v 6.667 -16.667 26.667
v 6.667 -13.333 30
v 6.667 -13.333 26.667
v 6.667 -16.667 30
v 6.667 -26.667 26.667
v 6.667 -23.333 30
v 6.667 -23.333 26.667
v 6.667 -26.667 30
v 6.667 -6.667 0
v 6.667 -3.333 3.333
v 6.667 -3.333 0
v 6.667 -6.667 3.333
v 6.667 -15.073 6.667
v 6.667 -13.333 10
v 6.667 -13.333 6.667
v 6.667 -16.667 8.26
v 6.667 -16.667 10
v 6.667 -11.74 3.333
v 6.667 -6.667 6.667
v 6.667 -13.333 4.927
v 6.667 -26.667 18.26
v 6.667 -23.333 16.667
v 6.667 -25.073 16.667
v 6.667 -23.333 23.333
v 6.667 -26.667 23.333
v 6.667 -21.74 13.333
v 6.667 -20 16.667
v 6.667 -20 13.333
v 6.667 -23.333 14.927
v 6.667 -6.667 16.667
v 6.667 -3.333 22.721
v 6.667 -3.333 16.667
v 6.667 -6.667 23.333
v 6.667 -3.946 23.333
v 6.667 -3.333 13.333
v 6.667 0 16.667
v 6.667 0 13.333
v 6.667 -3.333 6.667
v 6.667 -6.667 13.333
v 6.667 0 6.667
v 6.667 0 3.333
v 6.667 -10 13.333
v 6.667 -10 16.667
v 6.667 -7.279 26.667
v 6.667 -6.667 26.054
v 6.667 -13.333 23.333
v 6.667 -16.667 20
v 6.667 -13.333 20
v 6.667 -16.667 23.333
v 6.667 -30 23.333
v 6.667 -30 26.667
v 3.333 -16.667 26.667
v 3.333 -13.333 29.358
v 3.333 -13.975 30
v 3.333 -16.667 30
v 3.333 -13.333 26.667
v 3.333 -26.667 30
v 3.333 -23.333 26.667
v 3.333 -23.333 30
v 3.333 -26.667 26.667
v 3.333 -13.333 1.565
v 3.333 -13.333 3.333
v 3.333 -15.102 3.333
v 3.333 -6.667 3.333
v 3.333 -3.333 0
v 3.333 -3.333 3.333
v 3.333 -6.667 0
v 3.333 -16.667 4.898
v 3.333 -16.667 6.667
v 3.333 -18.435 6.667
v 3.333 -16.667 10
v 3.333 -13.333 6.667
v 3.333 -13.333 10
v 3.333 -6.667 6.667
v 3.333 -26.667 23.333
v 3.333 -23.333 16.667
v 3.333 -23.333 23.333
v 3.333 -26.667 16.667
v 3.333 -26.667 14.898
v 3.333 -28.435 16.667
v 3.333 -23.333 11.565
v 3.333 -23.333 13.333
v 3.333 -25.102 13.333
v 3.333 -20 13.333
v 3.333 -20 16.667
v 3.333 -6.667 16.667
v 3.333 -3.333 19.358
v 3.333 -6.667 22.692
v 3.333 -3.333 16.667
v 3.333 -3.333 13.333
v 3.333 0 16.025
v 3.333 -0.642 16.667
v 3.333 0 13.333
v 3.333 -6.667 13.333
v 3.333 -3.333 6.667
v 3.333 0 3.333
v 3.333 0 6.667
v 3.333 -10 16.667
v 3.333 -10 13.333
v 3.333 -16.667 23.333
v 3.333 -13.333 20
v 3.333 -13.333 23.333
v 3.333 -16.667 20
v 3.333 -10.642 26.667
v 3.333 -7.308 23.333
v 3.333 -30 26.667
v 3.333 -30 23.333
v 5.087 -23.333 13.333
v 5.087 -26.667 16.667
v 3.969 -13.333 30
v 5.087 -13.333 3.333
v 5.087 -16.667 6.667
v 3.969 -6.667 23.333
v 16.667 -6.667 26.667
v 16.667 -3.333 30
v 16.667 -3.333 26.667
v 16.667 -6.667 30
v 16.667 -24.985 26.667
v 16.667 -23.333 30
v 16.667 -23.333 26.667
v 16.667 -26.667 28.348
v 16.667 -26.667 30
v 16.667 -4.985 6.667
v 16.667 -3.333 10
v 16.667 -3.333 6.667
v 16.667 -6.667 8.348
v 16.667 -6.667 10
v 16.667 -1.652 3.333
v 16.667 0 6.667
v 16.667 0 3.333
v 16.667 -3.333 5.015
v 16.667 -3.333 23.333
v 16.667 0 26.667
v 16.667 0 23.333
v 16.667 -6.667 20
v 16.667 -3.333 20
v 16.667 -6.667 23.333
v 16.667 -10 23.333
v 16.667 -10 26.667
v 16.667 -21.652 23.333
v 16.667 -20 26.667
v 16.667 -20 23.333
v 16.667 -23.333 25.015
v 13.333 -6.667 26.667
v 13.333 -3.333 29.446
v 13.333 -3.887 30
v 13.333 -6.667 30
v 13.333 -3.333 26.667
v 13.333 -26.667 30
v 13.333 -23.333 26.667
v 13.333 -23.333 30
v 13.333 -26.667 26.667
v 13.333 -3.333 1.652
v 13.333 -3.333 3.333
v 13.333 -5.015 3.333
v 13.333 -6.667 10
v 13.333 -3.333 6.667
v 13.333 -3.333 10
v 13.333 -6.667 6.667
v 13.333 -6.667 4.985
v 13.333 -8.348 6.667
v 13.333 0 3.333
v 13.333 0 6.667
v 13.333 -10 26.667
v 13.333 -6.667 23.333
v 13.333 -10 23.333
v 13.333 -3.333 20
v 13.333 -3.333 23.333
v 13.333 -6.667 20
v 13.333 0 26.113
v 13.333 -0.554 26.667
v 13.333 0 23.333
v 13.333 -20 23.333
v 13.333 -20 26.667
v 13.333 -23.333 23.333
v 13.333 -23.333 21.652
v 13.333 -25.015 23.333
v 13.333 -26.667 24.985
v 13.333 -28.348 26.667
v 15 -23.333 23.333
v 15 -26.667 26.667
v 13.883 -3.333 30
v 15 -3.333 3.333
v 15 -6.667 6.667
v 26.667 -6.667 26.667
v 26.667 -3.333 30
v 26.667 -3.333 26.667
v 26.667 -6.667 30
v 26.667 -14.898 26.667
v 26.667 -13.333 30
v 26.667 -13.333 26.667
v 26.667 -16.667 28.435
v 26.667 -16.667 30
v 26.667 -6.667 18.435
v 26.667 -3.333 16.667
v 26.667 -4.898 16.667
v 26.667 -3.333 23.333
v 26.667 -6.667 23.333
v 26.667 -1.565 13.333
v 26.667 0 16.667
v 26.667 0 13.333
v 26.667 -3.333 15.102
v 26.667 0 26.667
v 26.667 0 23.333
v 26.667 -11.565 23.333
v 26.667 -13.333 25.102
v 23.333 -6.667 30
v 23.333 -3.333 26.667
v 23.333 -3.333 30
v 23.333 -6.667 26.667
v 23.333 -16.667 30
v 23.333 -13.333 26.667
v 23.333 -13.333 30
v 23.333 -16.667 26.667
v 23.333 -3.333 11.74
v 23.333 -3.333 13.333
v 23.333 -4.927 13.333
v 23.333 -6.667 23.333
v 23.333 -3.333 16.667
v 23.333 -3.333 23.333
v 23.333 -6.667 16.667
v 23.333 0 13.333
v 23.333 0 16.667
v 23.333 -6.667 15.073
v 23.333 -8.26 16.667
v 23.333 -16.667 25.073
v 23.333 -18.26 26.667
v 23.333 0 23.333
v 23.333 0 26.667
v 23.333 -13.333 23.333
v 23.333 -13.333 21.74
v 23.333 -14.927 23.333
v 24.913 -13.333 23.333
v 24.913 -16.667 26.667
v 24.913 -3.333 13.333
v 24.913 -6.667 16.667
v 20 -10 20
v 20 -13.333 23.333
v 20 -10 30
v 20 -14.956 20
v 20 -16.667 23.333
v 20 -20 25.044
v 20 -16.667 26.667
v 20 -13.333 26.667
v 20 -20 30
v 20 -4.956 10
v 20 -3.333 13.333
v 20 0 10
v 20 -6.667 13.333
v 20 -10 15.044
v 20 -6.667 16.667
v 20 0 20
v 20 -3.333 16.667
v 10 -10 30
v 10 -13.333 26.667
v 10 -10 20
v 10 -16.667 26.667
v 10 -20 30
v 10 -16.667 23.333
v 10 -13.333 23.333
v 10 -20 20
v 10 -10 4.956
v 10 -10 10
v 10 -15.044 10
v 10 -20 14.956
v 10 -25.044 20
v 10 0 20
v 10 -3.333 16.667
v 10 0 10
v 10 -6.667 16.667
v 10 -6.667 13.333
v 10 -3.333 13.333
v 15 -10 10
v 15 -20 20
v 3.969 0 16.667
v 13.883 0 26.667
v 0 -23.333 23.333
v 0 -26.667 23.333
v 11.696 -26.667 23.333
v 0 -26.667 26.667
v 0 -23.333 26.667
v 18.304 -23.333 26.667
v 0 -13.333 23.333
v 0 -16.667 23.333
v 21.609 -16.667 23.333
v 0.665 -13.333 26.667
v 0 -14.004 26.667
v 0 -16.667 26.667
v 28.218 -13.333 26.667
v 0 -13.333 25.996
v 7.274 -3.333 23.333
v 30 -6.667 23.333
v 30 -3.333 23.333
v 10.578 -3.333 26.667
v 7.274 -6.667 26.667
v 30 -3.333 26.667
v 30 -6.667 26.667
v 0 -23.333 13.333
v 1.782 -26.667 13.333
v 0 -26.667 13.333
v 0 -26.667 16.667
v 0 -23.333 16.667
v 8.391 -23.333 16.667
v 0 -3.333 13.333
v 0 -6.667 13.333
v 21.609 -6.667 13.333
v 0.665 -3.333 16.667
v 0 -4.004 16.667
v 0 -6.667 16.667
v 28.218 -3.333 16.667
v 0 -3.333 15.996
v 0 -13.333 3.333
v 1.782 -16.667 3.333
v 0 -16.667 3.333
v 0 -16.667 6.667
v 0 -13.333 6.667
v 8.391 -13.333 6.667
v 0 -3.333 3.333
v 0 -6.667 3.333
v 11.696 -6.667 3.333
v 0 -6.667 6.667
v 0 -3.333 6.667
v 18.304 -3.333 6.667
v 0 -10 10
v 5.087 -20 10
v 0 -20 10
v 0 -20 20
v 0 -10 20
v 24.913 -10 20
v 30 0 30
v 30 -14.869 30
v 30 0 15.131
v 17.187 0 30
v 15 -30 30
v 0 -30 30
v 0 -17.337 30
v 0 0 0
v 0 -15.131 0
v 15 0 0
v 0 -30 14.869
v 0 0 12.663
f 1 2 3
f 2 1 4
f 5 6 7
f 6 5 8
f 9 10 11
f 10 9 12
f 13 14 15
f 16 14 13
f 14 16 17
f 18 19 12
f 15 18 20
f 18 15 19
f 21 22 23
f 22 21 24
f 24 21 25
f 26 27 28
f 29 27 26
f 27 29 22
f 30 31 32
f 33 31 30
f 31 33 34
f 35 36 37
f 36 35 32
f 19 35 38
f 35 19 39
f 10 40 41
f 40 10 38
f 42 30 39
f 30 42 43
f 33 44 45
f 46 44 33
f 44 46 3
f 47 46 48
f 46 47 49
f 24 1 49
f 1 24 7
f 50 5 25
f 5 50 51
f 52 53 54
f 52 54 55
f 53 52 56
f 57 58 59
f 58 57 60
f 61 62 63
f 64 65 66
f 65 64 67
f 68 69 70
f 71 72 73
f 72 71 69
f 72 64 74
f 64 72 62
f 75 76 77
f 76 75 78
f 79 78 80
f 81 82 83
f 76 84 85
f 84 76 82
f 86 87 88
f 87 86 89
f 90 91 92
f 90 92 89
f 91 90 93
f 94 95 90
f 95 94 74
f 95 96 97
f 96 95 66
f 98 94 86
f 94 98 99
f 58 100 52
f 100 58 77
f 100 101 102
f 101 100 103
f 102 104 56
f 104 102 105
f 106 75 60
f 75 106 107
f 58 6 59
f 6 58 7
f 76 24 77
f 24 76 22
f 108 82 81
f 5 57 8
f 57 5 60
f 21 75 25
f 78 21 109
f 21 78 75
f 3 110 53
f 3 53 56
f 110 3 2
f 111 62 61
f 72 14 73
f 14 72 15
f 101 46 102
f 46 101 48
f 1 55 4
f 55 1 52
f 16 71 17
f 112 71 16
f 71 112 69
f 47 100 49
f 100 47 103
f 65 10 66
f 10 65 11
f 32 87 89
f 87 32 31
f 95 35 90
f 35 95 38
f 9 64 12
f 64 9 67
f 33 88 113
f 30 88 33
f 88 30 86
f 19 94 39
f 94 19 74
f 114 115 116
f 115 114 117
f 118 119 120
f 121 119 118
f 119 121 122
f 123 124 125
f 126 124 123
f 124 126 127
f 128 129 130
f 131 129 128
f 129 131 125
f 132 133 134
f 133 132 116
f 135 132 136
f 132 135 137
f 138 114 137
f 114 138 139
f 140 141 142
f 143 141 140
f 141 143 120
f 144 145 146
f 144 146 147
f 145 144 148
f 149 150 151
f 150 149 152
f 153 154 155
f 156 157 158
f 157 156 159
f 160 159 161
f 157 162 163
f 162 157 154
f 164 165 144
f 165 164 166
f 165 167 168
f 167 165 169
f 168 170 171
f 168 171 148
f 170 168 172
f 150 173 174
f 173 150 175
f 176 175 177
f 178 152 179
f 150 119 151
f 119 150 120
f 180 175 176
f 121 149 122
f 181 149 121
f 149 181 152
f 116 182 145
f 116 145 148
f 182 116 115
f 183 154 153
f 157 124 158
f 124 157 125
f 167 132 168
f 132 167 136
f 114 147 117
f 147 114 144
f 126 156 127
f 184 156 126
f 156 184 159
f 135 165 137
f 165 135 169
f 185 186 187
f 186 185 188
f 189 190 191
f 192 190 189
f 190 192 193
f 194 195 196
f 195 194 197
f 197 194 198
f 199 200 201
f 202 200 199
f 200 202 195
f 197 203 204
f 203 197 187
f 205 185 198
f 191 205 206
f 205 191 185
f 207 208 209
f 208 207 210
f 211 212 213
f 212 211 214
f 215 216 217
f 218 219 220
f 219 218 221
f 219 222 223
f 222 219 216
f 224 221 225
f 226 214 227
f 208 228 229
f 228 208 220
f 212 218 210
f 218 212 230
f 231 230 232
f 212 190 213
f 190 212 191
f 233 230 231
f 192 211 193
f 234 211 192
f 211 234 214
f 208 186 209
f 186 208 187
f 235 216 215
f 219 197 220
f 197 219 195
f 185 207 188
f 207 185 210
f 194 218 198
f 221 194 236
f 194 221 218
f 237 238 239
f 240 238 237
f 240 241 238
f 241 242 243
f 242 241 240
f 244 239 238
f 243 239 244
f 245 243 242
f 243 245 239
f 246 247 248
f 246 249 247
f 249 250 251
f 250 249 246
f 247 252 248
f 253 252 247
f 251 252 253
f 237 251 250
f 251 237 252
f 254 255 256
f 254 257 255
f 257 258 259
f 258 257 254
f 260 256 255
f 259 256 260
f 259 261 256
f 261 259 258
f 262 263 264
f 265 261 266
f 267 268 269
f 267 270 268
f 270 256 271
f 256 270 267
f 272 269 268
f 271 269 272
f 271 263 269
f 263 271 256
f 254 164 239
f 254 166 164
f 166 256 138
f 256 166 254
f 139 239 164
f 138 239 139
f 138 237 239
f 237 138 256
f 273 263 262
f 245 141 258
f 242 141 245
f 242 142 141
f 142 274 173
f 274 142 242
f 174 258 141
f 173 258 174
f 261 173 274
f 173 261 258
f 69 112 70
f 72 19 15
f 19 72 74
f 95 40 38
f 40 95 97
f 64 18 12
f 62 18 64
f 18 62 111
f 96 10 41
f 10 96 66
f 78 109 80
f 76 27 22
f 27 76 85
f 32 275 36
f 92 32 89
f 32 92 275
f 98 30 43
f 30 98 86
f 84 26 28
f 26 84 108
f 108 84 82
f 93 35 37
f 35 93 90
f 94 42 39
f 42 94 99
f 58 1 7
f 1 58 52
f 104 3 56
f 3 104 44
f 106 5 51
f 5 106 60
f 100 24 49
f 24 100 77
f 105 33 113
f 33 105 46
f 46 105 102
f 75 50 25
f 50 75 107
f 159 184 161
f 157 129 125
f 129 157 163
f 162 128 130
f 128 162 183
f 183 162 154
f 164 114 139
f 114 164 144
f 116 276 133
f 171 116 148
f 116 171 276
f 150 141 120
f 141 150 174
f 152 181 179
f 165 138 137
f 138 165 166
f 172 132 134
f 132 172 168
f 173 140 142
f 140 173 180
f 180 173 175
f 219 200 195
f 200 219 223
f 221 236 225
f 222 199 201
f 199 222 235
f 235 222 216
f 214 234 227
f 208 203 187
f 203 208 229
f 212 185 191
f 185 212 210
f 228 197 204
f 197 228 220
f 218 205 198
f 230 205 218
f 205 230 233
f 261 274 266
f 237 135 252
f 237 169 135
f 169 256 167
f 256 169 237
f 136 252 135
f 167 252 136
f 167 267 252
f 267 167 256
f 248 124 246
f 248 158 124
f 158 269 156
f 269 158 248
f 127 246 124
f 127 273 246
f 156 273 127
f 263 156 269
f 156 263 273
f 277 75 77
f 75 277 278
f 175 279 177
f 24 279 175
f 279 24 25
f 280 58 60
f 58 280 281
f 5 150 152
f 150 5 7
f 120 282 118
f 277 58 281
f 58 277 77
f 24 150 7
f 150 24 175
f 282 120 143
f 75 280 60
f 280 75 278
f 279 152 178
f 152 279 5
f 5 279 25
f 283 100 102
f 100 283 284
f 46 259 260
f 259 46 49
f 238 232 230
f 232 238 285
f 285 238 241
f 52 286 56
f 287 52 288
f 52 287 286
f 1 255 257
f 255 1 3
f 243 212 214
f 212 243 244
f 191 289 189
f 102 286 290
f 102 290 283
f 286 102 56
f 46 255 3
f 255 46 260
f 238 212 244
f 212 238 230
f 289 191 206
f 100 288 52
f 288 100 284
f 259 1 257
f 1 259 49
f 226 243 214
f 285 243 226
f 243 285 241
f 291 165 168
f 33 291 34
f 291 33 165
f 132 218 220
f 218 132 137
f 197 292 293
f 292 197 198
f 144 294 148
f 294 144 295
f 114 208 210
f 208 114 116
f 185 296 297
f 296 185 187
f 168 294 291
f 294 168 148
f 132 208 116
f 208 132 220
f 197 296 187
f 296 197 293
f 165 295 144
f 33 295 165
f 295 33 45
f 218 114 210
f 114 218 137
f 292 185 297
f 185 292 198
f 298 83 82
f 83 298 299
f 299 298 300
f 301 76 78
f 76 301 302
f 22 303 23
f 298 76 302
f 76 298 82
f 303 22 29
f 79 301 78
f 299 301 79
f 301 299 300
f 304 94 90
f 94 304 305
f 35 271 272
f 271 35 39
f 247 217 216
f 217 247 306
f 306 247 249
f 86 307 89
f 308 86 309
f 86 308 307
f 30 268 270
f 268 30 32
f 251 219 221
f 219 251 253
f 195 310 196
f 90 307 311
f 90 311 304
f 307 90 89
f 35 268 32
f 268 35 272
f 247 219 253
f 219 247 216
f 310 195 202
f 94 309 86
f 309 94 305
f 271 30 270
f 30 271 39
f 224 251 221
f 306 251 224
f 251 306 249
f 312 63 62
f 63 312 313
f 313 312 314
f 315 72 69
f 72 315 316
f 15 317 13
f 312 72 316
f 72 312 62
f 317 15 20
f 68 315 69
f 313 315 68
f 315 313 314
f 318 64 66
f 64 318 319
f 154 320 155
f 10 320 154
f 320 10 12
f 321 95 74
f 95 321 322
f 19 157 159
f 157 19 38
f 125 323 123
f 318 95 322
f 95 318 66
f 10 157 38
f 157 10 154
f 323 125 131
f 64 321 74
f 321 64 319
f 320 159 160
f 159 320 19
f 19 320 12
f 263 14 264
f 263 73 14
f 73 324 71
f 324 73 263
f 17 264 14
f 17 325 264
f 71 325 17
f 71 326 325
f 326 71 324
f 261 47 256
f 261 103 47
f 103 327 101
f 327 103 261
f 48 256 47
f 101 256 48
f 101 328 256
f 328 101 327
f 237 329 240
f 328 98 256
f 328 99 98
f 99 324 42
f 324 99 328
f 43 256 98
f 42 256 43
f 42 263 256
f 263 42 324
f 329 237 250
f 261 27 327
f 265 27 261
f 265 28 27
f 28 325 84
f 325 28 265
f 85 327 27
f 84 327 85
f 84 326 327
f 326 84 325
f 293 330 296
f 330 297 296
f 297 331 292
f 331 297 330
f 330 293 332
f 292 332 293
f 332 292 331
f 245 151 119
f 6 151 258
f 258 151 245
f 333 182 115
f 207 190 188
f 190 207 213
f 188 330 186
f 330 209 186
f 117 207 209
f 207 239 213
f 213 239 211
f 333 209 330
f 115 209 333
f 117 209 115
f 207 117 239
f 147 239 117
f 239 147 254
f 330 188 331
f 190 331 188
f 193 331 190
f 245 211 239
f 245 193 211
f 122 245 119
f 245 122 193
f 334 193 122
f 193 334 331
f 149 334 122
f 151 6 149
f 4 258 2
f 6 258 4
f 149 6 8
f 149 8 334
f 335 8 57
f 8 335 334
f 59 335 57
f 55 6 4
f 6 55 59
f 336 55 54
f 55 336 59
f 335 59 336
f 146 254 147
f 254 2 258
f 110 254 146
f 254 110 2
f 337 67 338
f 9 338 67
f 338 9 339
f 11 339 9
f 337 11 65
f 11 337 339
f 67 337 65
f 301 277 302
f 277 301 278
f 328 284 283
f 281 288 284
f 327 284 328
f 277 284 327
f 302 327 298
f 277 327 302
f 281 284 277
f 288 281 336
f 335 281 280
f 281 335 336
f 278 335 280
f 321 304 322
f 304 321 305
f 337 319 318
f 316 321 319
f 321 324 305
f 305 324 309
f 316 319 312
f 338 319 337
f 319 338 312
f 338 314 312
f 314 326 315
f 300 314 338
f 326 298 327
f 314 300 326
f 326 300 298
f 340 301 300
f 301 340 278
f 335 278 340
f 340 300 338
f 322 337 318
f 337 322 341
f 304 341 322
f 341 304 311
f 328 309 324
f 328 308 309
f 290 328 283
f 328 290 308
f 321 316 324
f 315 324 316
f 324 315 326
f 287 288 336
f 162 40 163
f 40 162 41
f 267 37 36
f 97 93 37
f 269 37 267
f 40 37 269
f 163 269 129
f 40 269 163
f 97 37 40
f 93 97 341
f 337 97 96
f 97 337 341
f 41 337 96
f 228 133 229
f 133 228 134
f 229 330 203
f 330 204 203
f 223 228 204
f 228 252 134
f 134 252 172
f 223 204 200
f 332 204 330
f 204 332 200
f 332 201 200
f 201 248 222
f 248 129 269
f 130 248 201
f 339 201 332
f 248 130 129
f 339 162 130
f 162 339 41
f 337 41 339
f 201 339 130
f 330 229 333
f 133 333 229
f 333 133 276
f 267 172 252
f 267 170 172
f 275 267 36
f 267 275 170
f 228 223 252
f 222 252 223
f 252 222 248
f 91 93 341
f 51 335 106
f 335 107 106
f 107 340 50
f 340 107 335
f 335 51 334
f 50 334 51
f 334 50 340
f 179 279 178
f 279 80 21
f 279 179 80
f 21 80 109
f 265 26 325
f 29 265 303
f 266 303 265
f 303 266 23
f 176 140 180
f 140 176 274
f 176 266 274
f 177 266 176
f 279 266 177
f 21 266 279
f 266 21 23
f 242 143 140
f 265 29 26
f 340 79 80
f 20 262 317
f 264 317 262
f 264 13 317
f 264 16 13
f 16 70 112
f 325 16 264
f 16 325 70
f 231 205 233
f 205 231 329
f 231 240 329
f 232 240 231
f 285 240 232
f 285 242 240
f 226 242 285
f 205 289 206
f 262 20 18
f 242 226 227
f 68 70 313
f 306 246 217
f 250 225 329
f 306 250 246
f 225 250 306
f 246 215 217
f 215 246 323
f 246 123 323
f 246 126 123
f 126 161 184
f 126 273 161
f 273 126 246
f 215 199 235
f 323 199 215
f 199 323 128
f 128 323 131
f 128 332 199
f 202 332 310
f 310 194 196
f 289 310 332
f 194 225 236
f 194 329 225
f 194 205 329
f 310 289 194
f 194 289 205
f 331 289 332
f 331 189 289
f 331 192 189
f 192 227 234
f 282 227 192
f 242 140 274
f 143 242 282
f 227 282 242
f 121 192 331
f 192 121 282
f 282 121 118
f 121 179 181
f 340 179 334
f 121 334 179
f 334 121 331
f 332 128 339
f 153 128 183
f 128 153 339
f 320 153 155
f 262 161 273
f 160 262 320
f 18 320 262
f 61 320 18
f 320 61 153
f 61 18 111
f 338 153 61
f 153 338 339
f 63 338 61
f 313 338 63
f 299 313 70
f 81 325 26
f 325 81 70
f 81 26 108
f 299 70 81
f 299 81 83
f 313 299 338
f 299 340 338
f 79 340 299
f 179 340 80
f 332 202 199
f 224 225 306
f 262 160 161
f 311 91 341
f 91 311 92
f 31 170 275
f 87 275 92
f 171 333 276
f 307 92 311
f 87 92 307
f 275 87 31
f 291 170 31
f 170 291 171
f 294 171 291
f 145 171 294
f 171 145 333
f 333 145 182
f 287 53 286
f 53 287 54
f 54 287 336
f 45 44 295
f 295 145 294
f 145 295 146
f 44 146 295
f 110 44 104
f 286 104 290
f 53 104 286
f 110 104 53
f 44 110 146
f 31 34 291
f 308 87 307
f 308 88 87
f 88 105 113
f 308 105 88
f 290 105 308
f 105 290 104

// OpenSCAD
//======================================================================
// Menger1.scad
//
// Menger sponge created by cutting up a large cube
//
// DrTomFlint 7 May 2025
//======================================================================

// Menger sponge created by cutting up a large cube


thick=1.2;    // plate thickness
Ztab=1.2;     // depth of tabs into menge

F2=55;

//----------------------------------------------------------------------
module led(leads=10,tol=0,short=2){

  difference(){    
    cylinder(r=3.8/2+tol,h=1.25+tol,$fn=F2);
    //~ translate([2+1.4,0,0])
    //~ cube([4,4,10],center=true);
  }
  cylinder(r=3.0/2+tol,h=4+tol,$fn=F2);
  translate([0,0,4+tol])
  sphere(r=3.0/2+tol,$fn=F2);


  translate([1.0,0,-(leads-short)/2])
  cube([0.5+tol,0.5+tol,leads-short],center=true);
  
  color("red")
  translate([-1.0,0,-leads/2])
  cube([0.5+tol,0.5+tol,leads],center=true);
}


//----------------------------------------------------------------------
module menge(T=3,l=90){
  
  echo("Smallest cube is ", l/pow(3,T), " mm");


  //difference(){
  intersection(){

  // magic rotation 
  rotate([0,0,0])
  rotate([0,35.5,0])
  rotate([45,0,0])

  difference(){
    cube(l, center = true);
    
    cutz2();
    
    rotate([90,0,0])
    cutz2();
    
    rotate([0,90,0])
    cutz2();

  }

  // add a way to cut it
  //color("cyan")
  translate([0,0,1.0*l])
  cube(2*l, center=true);
  }
  
}

//----------------------------------------------------------------------
module box(T=3,l=90){
  
  echo("Smallest cube is ", l/pow(3,T), " mm");


  //difference(){
  intersection(){

  // magic rotation 
  rotate([0,0,0])
  rotate([0,35.5,0])
  rotate([45,0,0])

  difference(){
    cube(l, center = true);
    
    //~ cutz2();
    
    //~ rotate([90,0,0])
    //~ cutz2();
    
    //~ rotate([0,90,0])
    //~ cutz2();

  }

  // add a way to cut it
  //color("cyan")
  translate([0,0,1.0*l])
  cube(2*l, center=true);
  }
  
}
//----------------------------------------------------------------------
module cuts(T=3,l=90){
  
  echo("Smallest cube is ", l/pow(3,T), " mm");


  //difference(){
  intersection(){

  // magic rotation 
  rotate([0,0,0])
  rotate([0,35.5,0])
  rotate([45,0,0]){

    cutz2(tol=-0.25);
    
    rotate([90,0,0])
    cutz2(tol=-0.25);
    
    rotate([0,90,0])
    cutz2(tol=-0.25);
  }

  // add a way to cut it
  //color("cyan")
  translate([0,0,1.0*l])
  cube(2*l, center=true);
  }
  
}

//----------------------------------------------------------------------
module box8a(cut=66){
  translate([l/2,-l/2,l/2])
  rotate([-45,0,0])
  rotate([0,-35.5,0])
  difference(){
    //~ box(T=T,l=l);
    menge(T=T,l=l);
    translate([0,0,cut]) cube([400,400,100],center=true);
  }
}

//----------------------------------------------------------------------
module box8(part=3){

if(part==1){
  // lowers 4
  translate([0,0,-l])
  for(i=[0:3])
  rotate([0,0,i*90])
  box8a();
}

if(part==2){  
  // upper 4
  translate([0,0,l+2*thick+0.2])
  for(i=[0:3])
  rotate([0,0,i*90])
  rotate([0,180,0])
  box8a();
}

if(part==3){
  // lowers 4
  translate([0,0,-l])
  for(i=[0:3])
  rotate([0,0,i*90])
  box8a();
  // upper 4
  translate([0,0,l+2*thick+0.2])
  for(i=[0:3])
  rotate([0,0,i*90])
  rotate([0,180,0])
  box8a();  
}

}

//----------------------------------------------------------------------
module box9(part=3){

if(part==1){
  // lowers 4
  for(i=[0:3])
  rotate([0,0,i*90])
  translate([-l,-l,0])
  rotate([180,0,0])
  box8a();
}

if(part==2){
  // upper 4
  translate([0,0,2*thick+0.2])
  for(i=[0:3])
  rotate([0,0,i*90])
  rotate([0,180,0])
  translate([-l,-l,0])
  rotate([180,0,0])
  box8a();
}

if(part==3){
  // lowers 4
  for(i=[0:3])
  rotate([0,0,i*90])
  translate([-l,-l,0])
  rotate([180,0,0])
  box8a(cut=99);
  // upper 4
  translate([0,0,2*thick+0.2])
  for(i=[0:3])
  rotate([0,0,i*90])
  rotate([0,180,0])
  translate([-l,-l,0])
  rotate([180,0,0])
  box8a(cut=99);
}
  
}

//----------------------------------------------------------------------
module cuts9(part=3){

  // lowers 4
  for(i=[0:3])
  rotate([0,0,i*90])
  translate([-l,-l,0])
  rotate([180,0,0])
  cuts8a();

}

//----------------------------------------------------------------------
module cuts8a(cut=66){
  translate([l/2,-l/2,l/2])
  rotate([-45,0,0])
  rotate([0,-35.5,0])
  difference(){
    //~ box(T=T,l=l);
    cuts(T=T,l=l);
    translate([0,0,cut]) cube([400,400,100],center=true);
  }
}
//----------------------------------------------------------------------
module cuts8(){

  // lowers 4
  translate([0,0,-l])
  for(i=[0:3])
  rotate([0,0,i*90])
  cuts8a();
  
  //~ // upper 4
  //~ translate([0,0,l+2*thick])
  //~ for(i=[0:3])
  //~ rotate([0,0,i*90])
  //~ rotate([0,180,0])
  //~ cuts8a();
  
}

//----------------------------------------------------------------------
module boxIn(tol=0){

s1=0.575*l-tol;
s2=0.575*l-tol;

  translate([0,0,0])
  rotate([180,0,0])
  cylinder(r1=s1,r2=0.01,h=s2,$fn=4);
  translate([0,0,0])
  cylinder(r1=s1,r2=0.01,h=s2,$fn=4);
}

//----------------------------------------------------------------------
module boxLeds(tol=0.15,showleds=0){

s1=0.575*l-tol;
s2=0.575*l-tol;
zled=2.8;
zled2=2.22;


  difference(){
  cylinder(r1=s1,r2=0.01,h=s2,$fn=4);

    // 4 leds
    for(i=[0:3])
    translate([0,0,zled2])
    rotate([0,0,45+90*i])
    rotate([55,0,0])
    translate([0,0,zled])
    rotate([0,0,45]){
      cylinder(r=3.8/2+tol,h=1.25+tol,$fn=F2);
      cylinder(r=3.0/2+tol,h=14+tol,$fn=F2);
      translate([0,0,4.2])
      cylinder(r1=3.0/2+tol,r2=4,h=1.5+tol,$fn=F2);
    }
    // cut for wiring
    cylinder(r1=0.45*s1,r2=0.01,h=0.45*s2,$fn=4);
    #cylinder(r1=0.2*s1,r2=0.35*s1,h=s2,$fn=4);
  }
  
  // leds
  if(showleds==1){
    for(i=[0:3])
    translate([0,0,zled2])
    rotate([0,0,45+90*i])
    rotate([55,0,0])
    translate([0,0,zled])
    rotate([0,0,45])
    led(leads=3.8,tol=0.2);
  }

  
}

//----------------------------------------------------------------------
module cutz2(tol=0){

  for (k = [0:T]) {
    w = l/pow(3,k);
    
    for (x = [(-l/2)+1.5*w:3*w:(l/2)-w], y = [(-l/2)+1.5*w:3*w:(l/2)-w]) {
      translate([x,y,0])cube([w+tol,w+tol,l+1],center=true);
    }
  
  }
}


//----------------------------------------------------------------------
module plate(tol=0){


  difference(){
    translate([0,0,thick/2])
    intersection(){
      cube([2*l,2*l,thick],center=true);
      rotate([0,0,45])
      cube([2.12*l,2.12*l,thick],center=true);
    }
    // recut the 4 largest
    translate([l/2,l/2,0])
    cube([l/3,l/3,20],center=true);
    translate([-l/2,l/2,0])
    cube([l/3,l/3,20],center=true);
    translate([-l/2,-l/2,0])
    cube([l/3,l/3,20],center=true);
    translate([l/2,-l/2,0])
    cube([l/3,l/3,20],center=true);
    
    // central cavity
    translate([0,0,thick/2])
    rotate([0,0,45])
    cube([0.75*l,0.75*l,3*thick],center=true);
  }
  
  difference(){
    cuts8();
    translate([0,0,-Ztab-l])
    cube([4*l,4*l,2*l],center=true);
    // recut the 4 largest
    translate([l/2,l/2,0])
    cube([l/3,l/3,20],center=true);
    translate([-l/2,l/2,0])
    cube([l/3,l/3,20],center=true);
    translate([-l/2,-l/2,0])
    cube([l/3,l/3,20],center=true);
    translate([l/2,-l/2,0])
    cube([l/3,l/3,20],center=true);
  }
  
  difference(){
    boxIn(tol=0.1);
    translate([0,0,thick])
    boxIn(tol=0.1);
  }
  
  // hinge
  difference(){
    union(){
      translate([l+2,0,-thick+0.4])
      rotate([90,0,0])
      cylinder(r=2,h=l,center=true,$fn=F2);
      translate([l,0,thick/2])
      cube([5,l,thick],center=true);
    }
    translate([l+4,l/5,thick/2])
    cube([10,l/5,6*thick],center=true);    
    translate([l+4,-l/5,thick/2])
    cube([10,l/5,6*thick],center=true);    
    translate([l+2,0,-thick+0.4])
    rotate([90,0,0])
    cylinder(r=1,h=l+2,center=true,$fn=F2);

    translate([l+8,l/2+6,-thick+0.4])
    rotate([0,0,45])
    cube([20,20,20],center=true);    
    translate([l+8,-l/2-6,-thick+0.4])
    rotate([0,0,45])
    cube([20,20,20],center=true);    
  }
}

//----------------------------------------------------------------------
module plate9(tol=0.5){

  // main plate
  difference(){
    linear_extrude(height=thick)
    offset(r=1.5*thick,$fn=F2)
    square([2*l,2*l],center=true);
    
    translate([0,0,thick/2])
    intersection(){
      cube([2*l+tol,2*l+tol,thick+1],center=true);
      rotate([0,0,45])
      cube([2.12*l+tol,2.12*l+tol,thick+1],center=true);
    }
    translate([l,0,thick/2])
    cube([10,l+0.4,6*thick],center=true);    

    translate([l-6.75,l/2+0,-thick+0.4])
    rotate([0,0,45])
    cube([10,10,10],center=true);    
    translate([l-6.75,-l/2-0,-thick+0.4])
    rotate([0,0,45])
    cube([10,10,10],center=true);    
    
    // cut for hinge
    translate([l+4,0.75*l,thick/2])
    cube([10,l/6,6*thick],center=true); 
    translate([l+4,-0.75*l,thick/2])
    cube([10,l/6,6*thick],center=true); 
           
  }    
  
  // lip
  difference(){
    translate([0,0,-thick])
    linear_extrude(height=2*thick)
    offset(r=1.5*thick,$fn=F2)
    square([2*l,2*l],center=true);
    
    translate([0,0,-thick])
    linear_extrude(height=2*thick)
    offset(r=0.54*thick,$fn=F2)
    square([2*l,2*l],center=true);
    
    translate([l,0,thick/2])
    cube([10,2*l,6*thick],center=true);    

    translate([l-6.75,l/2+0,-thick+0.4])
    rotate([0,0,45])
    cube([10,10,10],center=true);    
    translate([l-6.75,-l/2-0,-thick+0.4])
    rotate([0,0,45])
    cube([10,10,10],center=true);    
  }    

  // interlocking tabs
  difference(){
    cuts9();
    translate([0,0,-l-thick])
    cube([3*l,3*l,2*l],center=true);    
  }
  
  // hinge
  difference(){
    union(){
      translate([l+2,0,-thick+0.4])
      rotate([90,0,0])
      cylinder(r=2,h=2*l,center=true,$fn=F2);
      translate([l,0,thick/2])
      cube([5,2*l,thick],center=true);
    }
    translate([l+4,0,thick/2])
    cube([10,l+0.4,6*thick],center=true);    
    translate([l,0,thick/2])
    cube([10,l+0.4,6*thick],center=true);    
    
    translate([l+4,0.75*l,thick/2])
    cube([10,l/6,6*thick],center=true); 
    translate([l+4,-0.75*l,thick/2])
    cube([10,l/6,6*thick],center=true); 
       
    translate([l+2,0,-thick+0.4])
    rotate([90,0,0])
    cylinder(r=1,h=2*l+2,center=true,$fn=F2);

    translate([l-6.75,l/2+0,-thick+0.4])
    rotate([0,0,45])
    cube([10,10,10],center=true);    
    translate([l-6.75,-l/2-0,-thick+0.4])
    rotate([0,0,45])
    cube([10,10,10],center=true);    
  }


}

//----------------------------------------------------------------------
module plate10(tol=0.5){

  // main plate
  difference(){
    linear_extrude(height=thick)
    offset(r=1.5*thick,$fn=F2)
    square([2*l,2*l],center=true);
       
    cylinder(r=0.75*l,h=3*thick,center=true,$fn=F2);
  }    
  
  // lip
  difference(){
    translate([0,0,-thick])
    linear_extrude(height=2*thick)
    offset(r=1.5*thick,$fn=F2)
    square([2*l,2*l],center=true);
    
    translate([0,0,-thick])
    linear_extrude(height=2*thick)
    offset(r=0.54*thick,$fn=F2)
    square([2*l,2*l],center=true);    
  }    

  // interlocking tabs
  difference(){
    cuts9();
    translate([0,0,-l-thick])
    cube([3*l,3*l,2*l],center=true);    
  }
  
}

//----------------------------------------------------------------------
module hinge(tol=0.2){

Zoff=3.5*thick;

  difference(){
    hull(){
      translate([l+2,l/5,-thick+0.4])
      rotate([90,0,0])
      cylinder(r=2,h=l/5-tol,center=true,$fn=F2);
      
      translate([l+2,l/5,-thick+0.4+Zoff])
      rotate([90,0,0])
      cylinder(r=2,h=l/5-tol,center=true,$fn=F2);
    }
    
    translate([l+2,0,-thick+0.4])
    rotate([90,0,0])
    cylinder(r=1,h=l+2,center=true,$fn=F2);
    translate([l+2,0,-thick+0.4+Zoff])
    rotate([90,0,0])
    cylinder(r=1,h=l+2,center=true,$fn=F2);
  }

}

//----------------------------------------------------------------------
module hinge9(tol=0.2){

Zoff=3.5*thick;

  difference(){
    hull(){
      translate([l+2,l/6,-thick+0.4])
      rotate([90,0,0])
      cylinder(r=2,h=l/6-tol,center=true,$fn=F2);
      
      translate([l+2,l/6,-thick+0.4+Zoff])
      rotate([90,0,0])
      cylinder(r=2,h=l/6-tol,center=true,$fn=F2);
    }
    
    translate([l+2,0,-thick+0.4])
    rotate([90,0,0])
    cylinder(r=1,h=l+2,center=true,$fn=F2);
    translate([l+2,0,-thick+0.4+Zoff])
    rotate([90,0,0])
    cylinder(r=1,h=l+2,center=true,$fn=F2);
  }

}

//----------------------------------------------------------------------
module plateA(tol=0){

  difference(){
    plate();
    translate([0,0,thick/2])
    intersection(){
      cube([2*l-thick,2*l-thick,4*l],center=true);
      rotate([0,0,45])
      cube([2.12*l-thick,2.12*l-thick,4*l],center=true);
    }
  }
}

//----------------------------------------------------------------------
module plateB(tol=0){

difference(){
  intersection(){
    plate();
    translate([0,0,thick/2])
    intersection(){
      cube([2*l-thick,2*l-thick,4*l],center=true);
      rotate([0,0,45])
      cube([2.12*l-thick,2.12*l-thick,4*l],center=true);
    }
  }
  rotate([0,0,45])
  cube([0.75*l,0.75*l,2*l],center=true);
}

}

//----------------------------------------------------------------------
module plateB2(tol=0){

difference(){
  intersection(){
    plate();
    translate([0,0,thick/2])
    intersection(){
      cube([2*l-thick,2*l-thick,4*l],center=true);
      rotate([0,0,45])
      cube([2.12*l-thick,2.12*l-thick,4*l],center=true);
    }
  }
  rotate([0,0,45])
  cube([0.75*l+2*thick,0.75*l+2*thick,2*l],center=true);

  rotate([0,0,45])
  linear_extrude(height=thick,scale=1.1)
  square([0.75*l+2*thick,0.75*l+2*thick],center=true);
}

}

//----------------------------------------------------------------------
module plateB2a(tol=0){

  difference(){
    plateB2();
    rotate([0,0,45])
    linear_extrude(height=thick,scale=1.1)
    square([1.5*l,1.5*l],center=true);
  }

}

//----------------------------------------------------------------------
module plateB2b(tol=0){

  difference(){
    intersection(){
      plateB2();
      rotate([0,0,45])
      linear_extrude(height=thick,scale=1.1)
      square([1.5*l,1.5*l],center=true);
    }
    rotate([0,0,45])
    linear_extrude(height=thick,scale=1.1)
    square([1.1*l,1.1*l],center=true);
  }
}

//----------------------------------------------------------------------
module plateB2c(tol=0){


  intersection(){
    plateB2();
    rotate([0,0,45])
    linear_extrude(height=thick,scale=1.1)
    square([1.1*l,1.1*l],center=true);
  }
}

//----------------------------------------------------------------------
module plateC(tol=0){

  intersection(){
    plate();
    rotate([0,0,45])
    cube([0.75*l,0.75*l,2*l],center=true);
  }
  
}

//----------------------------------------------------------------------
// Add a cut for LED wires
module box8b(){
  
  difference(){
    box8a();
    cylinder(r=4,h=100,$fn=55,center=true);
  }
  
}

//======================================================================

// Order
T=2; l=30;
//~ T=3; l=90;
//~ T=4; l=270;

//~ menge(T=T,l=l);

//~ cutz2();


// remove top for 8-ball construction
//~ difference(){
//~ menge(T=T,l=l);
//~ translate([0,0,66]) cube([400,400,100],center=true);
//~ }


box8a();
//~ box8b();


// tests for internal space
//~ box8(part=1);
//~ box8(part=2);
//~ box8(part=3);

//~ boxIn(tol=0.4);
//~ boxLeds(tol=0.2,showleds=0);

//~ plate();

//~ translate([0,0,2*thick+0.2])
//~ rotate([180,0,0])
//~ plate();


// cut up plate for multi-color prints
//~ plateA();     // outer rim and hinge
//~ plateB();     // inner flat
//~ plateB2();     // inner flat

//~ plateB2a();     // inner flat
//~ plateB2b();     // inner flat
//~ plateB2c();     // inner flat

//~ plateC();     // pyramid tent


//~ hinge();

//~ cuts8a();
//~ box8a();

//~ cuts8();


//~ box9(part=1);

//~ plate9();
//~ hinge9();

//~ plate10();


//~ cuts9();

//======================================================================
